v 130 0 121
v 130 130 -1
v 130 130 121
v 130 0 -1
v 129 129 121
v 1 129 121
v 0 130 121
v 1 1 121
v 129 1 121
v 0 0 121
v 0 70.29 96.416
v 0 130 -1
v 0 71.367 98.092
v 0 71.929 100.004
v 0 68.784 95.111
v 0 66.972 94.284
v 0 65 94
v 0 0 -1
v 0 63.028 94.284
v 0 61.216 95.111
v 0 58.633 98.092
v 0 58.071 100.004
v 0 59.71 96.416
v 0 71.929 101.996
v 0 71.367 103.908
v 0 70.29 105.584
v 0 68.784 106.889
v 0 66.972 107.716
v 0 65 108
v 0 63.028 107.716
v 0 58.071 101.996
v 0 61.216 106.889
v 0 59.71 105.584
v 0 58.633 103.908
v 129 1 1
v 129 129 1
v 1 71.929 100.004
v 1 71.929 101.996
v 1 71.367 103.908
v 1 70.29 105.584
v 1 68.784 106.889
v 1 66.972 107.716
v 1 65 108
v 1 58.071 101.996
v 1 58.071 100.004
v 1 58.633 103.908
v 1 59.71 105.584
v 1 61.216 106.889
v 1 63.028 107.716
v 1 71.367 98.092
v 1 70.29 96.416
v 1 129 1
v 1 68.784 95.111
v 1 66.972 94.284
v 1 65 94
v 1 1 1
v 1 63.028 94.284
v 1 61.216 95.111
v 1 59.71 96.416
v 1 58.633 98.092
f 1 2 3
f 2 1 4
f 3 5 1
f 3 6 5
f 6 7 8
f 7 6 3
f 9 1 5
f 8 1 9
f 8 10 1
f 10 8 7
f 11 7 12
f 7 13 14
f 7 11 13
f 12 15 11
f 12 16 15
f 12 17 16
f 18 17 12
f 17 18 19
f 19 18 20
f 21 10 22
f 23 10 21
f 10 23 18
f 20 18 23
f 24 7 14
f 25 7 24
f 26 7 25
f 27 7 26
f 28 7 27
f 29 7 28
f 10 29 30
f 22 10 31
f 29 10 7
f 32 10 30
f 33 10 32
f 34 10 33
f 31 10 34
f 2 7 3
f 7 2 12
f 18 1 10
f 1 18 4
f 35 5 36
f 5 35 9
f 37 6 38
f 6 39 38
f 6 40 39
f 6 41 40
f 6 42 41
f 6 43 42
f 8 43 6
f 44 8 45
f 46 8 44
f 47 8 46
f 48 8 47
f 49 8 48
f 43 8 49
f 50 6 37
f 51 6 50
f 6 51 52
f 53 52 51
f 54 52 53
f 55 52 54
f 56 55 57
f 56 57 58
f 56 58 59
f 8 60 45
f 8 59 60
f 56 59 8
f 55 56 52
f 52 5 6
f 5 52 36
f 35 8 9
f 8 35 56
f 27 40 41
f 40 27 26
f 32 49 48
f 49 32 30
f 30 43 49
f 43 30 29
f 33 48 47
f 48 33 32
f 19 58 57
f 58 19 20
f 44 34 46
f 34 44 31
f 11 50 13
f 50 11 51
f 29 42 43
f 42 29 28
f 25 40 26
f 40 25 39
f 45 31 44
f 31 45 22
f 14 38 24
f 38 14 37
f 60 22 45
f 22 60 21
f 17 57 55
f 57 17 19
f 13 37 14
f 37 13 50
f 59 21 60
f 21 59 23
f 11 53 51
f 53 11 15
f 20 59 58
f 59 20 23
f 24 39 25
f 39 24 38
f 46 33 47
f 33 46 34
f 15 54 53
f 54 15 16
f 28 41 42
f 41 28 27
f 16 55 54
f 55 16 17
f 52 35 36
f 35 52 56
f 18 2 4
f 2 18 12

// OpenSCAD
meshX=26;
meshY=18;
meshZ=40;
Seedrows=4;
Seedcolumns=4;

spokeCount=24;
spokerows=8;
spokeDia=15;
spokeY=2;
wallWidth=2;

//Single Plant Box
//reservoir(130,130,2,121);

module lip(x,y,wall, height)
{
     translate([x/2,y/2,height/2]) difference()
    {
    cube([x,y,height],true);
    cube([x-wall,y-wall,height+1], true);
    }
}

module overlap(x,y,thickness, base)
{
    height=3;
    wall=3;
    
    echo(x=x,y=y,thickness=thickness, base=base);
    difference()
    {
    color("red")  cube([x,y,thickness],true);
     color("pink") cube([x-base,y-base,thickness+2],true);   
    }
    
    translate([0,0,thickness]) difference()
    {
    color("blue") cube([x,y,height],true);
    //color("lightblue") cube([x-wall,y-wall,height+1], true);
    }
}

module reservoir(x,y,wall, height)
{
    echo(x=x,y=y,wall=wall, height=height);
    //resize([0,0,0]) 
    translate([x/2,y/2,0]) 
    cube([x,y,wall],true);
    difference()
    {
    lip(x,y,wall,height);
    color("blue") translate([-5,y/2,height-(meshZ/2)])
    rotate(a=180, v=[1,0,1]) cylinder(20,7,7, false);
    }
    
}

//difference()
//{
//overlap(198,198,3,3);
//translate(0,0,-2) cube([170,170,10],true);
//}

reservoir(130,130,2,121);
